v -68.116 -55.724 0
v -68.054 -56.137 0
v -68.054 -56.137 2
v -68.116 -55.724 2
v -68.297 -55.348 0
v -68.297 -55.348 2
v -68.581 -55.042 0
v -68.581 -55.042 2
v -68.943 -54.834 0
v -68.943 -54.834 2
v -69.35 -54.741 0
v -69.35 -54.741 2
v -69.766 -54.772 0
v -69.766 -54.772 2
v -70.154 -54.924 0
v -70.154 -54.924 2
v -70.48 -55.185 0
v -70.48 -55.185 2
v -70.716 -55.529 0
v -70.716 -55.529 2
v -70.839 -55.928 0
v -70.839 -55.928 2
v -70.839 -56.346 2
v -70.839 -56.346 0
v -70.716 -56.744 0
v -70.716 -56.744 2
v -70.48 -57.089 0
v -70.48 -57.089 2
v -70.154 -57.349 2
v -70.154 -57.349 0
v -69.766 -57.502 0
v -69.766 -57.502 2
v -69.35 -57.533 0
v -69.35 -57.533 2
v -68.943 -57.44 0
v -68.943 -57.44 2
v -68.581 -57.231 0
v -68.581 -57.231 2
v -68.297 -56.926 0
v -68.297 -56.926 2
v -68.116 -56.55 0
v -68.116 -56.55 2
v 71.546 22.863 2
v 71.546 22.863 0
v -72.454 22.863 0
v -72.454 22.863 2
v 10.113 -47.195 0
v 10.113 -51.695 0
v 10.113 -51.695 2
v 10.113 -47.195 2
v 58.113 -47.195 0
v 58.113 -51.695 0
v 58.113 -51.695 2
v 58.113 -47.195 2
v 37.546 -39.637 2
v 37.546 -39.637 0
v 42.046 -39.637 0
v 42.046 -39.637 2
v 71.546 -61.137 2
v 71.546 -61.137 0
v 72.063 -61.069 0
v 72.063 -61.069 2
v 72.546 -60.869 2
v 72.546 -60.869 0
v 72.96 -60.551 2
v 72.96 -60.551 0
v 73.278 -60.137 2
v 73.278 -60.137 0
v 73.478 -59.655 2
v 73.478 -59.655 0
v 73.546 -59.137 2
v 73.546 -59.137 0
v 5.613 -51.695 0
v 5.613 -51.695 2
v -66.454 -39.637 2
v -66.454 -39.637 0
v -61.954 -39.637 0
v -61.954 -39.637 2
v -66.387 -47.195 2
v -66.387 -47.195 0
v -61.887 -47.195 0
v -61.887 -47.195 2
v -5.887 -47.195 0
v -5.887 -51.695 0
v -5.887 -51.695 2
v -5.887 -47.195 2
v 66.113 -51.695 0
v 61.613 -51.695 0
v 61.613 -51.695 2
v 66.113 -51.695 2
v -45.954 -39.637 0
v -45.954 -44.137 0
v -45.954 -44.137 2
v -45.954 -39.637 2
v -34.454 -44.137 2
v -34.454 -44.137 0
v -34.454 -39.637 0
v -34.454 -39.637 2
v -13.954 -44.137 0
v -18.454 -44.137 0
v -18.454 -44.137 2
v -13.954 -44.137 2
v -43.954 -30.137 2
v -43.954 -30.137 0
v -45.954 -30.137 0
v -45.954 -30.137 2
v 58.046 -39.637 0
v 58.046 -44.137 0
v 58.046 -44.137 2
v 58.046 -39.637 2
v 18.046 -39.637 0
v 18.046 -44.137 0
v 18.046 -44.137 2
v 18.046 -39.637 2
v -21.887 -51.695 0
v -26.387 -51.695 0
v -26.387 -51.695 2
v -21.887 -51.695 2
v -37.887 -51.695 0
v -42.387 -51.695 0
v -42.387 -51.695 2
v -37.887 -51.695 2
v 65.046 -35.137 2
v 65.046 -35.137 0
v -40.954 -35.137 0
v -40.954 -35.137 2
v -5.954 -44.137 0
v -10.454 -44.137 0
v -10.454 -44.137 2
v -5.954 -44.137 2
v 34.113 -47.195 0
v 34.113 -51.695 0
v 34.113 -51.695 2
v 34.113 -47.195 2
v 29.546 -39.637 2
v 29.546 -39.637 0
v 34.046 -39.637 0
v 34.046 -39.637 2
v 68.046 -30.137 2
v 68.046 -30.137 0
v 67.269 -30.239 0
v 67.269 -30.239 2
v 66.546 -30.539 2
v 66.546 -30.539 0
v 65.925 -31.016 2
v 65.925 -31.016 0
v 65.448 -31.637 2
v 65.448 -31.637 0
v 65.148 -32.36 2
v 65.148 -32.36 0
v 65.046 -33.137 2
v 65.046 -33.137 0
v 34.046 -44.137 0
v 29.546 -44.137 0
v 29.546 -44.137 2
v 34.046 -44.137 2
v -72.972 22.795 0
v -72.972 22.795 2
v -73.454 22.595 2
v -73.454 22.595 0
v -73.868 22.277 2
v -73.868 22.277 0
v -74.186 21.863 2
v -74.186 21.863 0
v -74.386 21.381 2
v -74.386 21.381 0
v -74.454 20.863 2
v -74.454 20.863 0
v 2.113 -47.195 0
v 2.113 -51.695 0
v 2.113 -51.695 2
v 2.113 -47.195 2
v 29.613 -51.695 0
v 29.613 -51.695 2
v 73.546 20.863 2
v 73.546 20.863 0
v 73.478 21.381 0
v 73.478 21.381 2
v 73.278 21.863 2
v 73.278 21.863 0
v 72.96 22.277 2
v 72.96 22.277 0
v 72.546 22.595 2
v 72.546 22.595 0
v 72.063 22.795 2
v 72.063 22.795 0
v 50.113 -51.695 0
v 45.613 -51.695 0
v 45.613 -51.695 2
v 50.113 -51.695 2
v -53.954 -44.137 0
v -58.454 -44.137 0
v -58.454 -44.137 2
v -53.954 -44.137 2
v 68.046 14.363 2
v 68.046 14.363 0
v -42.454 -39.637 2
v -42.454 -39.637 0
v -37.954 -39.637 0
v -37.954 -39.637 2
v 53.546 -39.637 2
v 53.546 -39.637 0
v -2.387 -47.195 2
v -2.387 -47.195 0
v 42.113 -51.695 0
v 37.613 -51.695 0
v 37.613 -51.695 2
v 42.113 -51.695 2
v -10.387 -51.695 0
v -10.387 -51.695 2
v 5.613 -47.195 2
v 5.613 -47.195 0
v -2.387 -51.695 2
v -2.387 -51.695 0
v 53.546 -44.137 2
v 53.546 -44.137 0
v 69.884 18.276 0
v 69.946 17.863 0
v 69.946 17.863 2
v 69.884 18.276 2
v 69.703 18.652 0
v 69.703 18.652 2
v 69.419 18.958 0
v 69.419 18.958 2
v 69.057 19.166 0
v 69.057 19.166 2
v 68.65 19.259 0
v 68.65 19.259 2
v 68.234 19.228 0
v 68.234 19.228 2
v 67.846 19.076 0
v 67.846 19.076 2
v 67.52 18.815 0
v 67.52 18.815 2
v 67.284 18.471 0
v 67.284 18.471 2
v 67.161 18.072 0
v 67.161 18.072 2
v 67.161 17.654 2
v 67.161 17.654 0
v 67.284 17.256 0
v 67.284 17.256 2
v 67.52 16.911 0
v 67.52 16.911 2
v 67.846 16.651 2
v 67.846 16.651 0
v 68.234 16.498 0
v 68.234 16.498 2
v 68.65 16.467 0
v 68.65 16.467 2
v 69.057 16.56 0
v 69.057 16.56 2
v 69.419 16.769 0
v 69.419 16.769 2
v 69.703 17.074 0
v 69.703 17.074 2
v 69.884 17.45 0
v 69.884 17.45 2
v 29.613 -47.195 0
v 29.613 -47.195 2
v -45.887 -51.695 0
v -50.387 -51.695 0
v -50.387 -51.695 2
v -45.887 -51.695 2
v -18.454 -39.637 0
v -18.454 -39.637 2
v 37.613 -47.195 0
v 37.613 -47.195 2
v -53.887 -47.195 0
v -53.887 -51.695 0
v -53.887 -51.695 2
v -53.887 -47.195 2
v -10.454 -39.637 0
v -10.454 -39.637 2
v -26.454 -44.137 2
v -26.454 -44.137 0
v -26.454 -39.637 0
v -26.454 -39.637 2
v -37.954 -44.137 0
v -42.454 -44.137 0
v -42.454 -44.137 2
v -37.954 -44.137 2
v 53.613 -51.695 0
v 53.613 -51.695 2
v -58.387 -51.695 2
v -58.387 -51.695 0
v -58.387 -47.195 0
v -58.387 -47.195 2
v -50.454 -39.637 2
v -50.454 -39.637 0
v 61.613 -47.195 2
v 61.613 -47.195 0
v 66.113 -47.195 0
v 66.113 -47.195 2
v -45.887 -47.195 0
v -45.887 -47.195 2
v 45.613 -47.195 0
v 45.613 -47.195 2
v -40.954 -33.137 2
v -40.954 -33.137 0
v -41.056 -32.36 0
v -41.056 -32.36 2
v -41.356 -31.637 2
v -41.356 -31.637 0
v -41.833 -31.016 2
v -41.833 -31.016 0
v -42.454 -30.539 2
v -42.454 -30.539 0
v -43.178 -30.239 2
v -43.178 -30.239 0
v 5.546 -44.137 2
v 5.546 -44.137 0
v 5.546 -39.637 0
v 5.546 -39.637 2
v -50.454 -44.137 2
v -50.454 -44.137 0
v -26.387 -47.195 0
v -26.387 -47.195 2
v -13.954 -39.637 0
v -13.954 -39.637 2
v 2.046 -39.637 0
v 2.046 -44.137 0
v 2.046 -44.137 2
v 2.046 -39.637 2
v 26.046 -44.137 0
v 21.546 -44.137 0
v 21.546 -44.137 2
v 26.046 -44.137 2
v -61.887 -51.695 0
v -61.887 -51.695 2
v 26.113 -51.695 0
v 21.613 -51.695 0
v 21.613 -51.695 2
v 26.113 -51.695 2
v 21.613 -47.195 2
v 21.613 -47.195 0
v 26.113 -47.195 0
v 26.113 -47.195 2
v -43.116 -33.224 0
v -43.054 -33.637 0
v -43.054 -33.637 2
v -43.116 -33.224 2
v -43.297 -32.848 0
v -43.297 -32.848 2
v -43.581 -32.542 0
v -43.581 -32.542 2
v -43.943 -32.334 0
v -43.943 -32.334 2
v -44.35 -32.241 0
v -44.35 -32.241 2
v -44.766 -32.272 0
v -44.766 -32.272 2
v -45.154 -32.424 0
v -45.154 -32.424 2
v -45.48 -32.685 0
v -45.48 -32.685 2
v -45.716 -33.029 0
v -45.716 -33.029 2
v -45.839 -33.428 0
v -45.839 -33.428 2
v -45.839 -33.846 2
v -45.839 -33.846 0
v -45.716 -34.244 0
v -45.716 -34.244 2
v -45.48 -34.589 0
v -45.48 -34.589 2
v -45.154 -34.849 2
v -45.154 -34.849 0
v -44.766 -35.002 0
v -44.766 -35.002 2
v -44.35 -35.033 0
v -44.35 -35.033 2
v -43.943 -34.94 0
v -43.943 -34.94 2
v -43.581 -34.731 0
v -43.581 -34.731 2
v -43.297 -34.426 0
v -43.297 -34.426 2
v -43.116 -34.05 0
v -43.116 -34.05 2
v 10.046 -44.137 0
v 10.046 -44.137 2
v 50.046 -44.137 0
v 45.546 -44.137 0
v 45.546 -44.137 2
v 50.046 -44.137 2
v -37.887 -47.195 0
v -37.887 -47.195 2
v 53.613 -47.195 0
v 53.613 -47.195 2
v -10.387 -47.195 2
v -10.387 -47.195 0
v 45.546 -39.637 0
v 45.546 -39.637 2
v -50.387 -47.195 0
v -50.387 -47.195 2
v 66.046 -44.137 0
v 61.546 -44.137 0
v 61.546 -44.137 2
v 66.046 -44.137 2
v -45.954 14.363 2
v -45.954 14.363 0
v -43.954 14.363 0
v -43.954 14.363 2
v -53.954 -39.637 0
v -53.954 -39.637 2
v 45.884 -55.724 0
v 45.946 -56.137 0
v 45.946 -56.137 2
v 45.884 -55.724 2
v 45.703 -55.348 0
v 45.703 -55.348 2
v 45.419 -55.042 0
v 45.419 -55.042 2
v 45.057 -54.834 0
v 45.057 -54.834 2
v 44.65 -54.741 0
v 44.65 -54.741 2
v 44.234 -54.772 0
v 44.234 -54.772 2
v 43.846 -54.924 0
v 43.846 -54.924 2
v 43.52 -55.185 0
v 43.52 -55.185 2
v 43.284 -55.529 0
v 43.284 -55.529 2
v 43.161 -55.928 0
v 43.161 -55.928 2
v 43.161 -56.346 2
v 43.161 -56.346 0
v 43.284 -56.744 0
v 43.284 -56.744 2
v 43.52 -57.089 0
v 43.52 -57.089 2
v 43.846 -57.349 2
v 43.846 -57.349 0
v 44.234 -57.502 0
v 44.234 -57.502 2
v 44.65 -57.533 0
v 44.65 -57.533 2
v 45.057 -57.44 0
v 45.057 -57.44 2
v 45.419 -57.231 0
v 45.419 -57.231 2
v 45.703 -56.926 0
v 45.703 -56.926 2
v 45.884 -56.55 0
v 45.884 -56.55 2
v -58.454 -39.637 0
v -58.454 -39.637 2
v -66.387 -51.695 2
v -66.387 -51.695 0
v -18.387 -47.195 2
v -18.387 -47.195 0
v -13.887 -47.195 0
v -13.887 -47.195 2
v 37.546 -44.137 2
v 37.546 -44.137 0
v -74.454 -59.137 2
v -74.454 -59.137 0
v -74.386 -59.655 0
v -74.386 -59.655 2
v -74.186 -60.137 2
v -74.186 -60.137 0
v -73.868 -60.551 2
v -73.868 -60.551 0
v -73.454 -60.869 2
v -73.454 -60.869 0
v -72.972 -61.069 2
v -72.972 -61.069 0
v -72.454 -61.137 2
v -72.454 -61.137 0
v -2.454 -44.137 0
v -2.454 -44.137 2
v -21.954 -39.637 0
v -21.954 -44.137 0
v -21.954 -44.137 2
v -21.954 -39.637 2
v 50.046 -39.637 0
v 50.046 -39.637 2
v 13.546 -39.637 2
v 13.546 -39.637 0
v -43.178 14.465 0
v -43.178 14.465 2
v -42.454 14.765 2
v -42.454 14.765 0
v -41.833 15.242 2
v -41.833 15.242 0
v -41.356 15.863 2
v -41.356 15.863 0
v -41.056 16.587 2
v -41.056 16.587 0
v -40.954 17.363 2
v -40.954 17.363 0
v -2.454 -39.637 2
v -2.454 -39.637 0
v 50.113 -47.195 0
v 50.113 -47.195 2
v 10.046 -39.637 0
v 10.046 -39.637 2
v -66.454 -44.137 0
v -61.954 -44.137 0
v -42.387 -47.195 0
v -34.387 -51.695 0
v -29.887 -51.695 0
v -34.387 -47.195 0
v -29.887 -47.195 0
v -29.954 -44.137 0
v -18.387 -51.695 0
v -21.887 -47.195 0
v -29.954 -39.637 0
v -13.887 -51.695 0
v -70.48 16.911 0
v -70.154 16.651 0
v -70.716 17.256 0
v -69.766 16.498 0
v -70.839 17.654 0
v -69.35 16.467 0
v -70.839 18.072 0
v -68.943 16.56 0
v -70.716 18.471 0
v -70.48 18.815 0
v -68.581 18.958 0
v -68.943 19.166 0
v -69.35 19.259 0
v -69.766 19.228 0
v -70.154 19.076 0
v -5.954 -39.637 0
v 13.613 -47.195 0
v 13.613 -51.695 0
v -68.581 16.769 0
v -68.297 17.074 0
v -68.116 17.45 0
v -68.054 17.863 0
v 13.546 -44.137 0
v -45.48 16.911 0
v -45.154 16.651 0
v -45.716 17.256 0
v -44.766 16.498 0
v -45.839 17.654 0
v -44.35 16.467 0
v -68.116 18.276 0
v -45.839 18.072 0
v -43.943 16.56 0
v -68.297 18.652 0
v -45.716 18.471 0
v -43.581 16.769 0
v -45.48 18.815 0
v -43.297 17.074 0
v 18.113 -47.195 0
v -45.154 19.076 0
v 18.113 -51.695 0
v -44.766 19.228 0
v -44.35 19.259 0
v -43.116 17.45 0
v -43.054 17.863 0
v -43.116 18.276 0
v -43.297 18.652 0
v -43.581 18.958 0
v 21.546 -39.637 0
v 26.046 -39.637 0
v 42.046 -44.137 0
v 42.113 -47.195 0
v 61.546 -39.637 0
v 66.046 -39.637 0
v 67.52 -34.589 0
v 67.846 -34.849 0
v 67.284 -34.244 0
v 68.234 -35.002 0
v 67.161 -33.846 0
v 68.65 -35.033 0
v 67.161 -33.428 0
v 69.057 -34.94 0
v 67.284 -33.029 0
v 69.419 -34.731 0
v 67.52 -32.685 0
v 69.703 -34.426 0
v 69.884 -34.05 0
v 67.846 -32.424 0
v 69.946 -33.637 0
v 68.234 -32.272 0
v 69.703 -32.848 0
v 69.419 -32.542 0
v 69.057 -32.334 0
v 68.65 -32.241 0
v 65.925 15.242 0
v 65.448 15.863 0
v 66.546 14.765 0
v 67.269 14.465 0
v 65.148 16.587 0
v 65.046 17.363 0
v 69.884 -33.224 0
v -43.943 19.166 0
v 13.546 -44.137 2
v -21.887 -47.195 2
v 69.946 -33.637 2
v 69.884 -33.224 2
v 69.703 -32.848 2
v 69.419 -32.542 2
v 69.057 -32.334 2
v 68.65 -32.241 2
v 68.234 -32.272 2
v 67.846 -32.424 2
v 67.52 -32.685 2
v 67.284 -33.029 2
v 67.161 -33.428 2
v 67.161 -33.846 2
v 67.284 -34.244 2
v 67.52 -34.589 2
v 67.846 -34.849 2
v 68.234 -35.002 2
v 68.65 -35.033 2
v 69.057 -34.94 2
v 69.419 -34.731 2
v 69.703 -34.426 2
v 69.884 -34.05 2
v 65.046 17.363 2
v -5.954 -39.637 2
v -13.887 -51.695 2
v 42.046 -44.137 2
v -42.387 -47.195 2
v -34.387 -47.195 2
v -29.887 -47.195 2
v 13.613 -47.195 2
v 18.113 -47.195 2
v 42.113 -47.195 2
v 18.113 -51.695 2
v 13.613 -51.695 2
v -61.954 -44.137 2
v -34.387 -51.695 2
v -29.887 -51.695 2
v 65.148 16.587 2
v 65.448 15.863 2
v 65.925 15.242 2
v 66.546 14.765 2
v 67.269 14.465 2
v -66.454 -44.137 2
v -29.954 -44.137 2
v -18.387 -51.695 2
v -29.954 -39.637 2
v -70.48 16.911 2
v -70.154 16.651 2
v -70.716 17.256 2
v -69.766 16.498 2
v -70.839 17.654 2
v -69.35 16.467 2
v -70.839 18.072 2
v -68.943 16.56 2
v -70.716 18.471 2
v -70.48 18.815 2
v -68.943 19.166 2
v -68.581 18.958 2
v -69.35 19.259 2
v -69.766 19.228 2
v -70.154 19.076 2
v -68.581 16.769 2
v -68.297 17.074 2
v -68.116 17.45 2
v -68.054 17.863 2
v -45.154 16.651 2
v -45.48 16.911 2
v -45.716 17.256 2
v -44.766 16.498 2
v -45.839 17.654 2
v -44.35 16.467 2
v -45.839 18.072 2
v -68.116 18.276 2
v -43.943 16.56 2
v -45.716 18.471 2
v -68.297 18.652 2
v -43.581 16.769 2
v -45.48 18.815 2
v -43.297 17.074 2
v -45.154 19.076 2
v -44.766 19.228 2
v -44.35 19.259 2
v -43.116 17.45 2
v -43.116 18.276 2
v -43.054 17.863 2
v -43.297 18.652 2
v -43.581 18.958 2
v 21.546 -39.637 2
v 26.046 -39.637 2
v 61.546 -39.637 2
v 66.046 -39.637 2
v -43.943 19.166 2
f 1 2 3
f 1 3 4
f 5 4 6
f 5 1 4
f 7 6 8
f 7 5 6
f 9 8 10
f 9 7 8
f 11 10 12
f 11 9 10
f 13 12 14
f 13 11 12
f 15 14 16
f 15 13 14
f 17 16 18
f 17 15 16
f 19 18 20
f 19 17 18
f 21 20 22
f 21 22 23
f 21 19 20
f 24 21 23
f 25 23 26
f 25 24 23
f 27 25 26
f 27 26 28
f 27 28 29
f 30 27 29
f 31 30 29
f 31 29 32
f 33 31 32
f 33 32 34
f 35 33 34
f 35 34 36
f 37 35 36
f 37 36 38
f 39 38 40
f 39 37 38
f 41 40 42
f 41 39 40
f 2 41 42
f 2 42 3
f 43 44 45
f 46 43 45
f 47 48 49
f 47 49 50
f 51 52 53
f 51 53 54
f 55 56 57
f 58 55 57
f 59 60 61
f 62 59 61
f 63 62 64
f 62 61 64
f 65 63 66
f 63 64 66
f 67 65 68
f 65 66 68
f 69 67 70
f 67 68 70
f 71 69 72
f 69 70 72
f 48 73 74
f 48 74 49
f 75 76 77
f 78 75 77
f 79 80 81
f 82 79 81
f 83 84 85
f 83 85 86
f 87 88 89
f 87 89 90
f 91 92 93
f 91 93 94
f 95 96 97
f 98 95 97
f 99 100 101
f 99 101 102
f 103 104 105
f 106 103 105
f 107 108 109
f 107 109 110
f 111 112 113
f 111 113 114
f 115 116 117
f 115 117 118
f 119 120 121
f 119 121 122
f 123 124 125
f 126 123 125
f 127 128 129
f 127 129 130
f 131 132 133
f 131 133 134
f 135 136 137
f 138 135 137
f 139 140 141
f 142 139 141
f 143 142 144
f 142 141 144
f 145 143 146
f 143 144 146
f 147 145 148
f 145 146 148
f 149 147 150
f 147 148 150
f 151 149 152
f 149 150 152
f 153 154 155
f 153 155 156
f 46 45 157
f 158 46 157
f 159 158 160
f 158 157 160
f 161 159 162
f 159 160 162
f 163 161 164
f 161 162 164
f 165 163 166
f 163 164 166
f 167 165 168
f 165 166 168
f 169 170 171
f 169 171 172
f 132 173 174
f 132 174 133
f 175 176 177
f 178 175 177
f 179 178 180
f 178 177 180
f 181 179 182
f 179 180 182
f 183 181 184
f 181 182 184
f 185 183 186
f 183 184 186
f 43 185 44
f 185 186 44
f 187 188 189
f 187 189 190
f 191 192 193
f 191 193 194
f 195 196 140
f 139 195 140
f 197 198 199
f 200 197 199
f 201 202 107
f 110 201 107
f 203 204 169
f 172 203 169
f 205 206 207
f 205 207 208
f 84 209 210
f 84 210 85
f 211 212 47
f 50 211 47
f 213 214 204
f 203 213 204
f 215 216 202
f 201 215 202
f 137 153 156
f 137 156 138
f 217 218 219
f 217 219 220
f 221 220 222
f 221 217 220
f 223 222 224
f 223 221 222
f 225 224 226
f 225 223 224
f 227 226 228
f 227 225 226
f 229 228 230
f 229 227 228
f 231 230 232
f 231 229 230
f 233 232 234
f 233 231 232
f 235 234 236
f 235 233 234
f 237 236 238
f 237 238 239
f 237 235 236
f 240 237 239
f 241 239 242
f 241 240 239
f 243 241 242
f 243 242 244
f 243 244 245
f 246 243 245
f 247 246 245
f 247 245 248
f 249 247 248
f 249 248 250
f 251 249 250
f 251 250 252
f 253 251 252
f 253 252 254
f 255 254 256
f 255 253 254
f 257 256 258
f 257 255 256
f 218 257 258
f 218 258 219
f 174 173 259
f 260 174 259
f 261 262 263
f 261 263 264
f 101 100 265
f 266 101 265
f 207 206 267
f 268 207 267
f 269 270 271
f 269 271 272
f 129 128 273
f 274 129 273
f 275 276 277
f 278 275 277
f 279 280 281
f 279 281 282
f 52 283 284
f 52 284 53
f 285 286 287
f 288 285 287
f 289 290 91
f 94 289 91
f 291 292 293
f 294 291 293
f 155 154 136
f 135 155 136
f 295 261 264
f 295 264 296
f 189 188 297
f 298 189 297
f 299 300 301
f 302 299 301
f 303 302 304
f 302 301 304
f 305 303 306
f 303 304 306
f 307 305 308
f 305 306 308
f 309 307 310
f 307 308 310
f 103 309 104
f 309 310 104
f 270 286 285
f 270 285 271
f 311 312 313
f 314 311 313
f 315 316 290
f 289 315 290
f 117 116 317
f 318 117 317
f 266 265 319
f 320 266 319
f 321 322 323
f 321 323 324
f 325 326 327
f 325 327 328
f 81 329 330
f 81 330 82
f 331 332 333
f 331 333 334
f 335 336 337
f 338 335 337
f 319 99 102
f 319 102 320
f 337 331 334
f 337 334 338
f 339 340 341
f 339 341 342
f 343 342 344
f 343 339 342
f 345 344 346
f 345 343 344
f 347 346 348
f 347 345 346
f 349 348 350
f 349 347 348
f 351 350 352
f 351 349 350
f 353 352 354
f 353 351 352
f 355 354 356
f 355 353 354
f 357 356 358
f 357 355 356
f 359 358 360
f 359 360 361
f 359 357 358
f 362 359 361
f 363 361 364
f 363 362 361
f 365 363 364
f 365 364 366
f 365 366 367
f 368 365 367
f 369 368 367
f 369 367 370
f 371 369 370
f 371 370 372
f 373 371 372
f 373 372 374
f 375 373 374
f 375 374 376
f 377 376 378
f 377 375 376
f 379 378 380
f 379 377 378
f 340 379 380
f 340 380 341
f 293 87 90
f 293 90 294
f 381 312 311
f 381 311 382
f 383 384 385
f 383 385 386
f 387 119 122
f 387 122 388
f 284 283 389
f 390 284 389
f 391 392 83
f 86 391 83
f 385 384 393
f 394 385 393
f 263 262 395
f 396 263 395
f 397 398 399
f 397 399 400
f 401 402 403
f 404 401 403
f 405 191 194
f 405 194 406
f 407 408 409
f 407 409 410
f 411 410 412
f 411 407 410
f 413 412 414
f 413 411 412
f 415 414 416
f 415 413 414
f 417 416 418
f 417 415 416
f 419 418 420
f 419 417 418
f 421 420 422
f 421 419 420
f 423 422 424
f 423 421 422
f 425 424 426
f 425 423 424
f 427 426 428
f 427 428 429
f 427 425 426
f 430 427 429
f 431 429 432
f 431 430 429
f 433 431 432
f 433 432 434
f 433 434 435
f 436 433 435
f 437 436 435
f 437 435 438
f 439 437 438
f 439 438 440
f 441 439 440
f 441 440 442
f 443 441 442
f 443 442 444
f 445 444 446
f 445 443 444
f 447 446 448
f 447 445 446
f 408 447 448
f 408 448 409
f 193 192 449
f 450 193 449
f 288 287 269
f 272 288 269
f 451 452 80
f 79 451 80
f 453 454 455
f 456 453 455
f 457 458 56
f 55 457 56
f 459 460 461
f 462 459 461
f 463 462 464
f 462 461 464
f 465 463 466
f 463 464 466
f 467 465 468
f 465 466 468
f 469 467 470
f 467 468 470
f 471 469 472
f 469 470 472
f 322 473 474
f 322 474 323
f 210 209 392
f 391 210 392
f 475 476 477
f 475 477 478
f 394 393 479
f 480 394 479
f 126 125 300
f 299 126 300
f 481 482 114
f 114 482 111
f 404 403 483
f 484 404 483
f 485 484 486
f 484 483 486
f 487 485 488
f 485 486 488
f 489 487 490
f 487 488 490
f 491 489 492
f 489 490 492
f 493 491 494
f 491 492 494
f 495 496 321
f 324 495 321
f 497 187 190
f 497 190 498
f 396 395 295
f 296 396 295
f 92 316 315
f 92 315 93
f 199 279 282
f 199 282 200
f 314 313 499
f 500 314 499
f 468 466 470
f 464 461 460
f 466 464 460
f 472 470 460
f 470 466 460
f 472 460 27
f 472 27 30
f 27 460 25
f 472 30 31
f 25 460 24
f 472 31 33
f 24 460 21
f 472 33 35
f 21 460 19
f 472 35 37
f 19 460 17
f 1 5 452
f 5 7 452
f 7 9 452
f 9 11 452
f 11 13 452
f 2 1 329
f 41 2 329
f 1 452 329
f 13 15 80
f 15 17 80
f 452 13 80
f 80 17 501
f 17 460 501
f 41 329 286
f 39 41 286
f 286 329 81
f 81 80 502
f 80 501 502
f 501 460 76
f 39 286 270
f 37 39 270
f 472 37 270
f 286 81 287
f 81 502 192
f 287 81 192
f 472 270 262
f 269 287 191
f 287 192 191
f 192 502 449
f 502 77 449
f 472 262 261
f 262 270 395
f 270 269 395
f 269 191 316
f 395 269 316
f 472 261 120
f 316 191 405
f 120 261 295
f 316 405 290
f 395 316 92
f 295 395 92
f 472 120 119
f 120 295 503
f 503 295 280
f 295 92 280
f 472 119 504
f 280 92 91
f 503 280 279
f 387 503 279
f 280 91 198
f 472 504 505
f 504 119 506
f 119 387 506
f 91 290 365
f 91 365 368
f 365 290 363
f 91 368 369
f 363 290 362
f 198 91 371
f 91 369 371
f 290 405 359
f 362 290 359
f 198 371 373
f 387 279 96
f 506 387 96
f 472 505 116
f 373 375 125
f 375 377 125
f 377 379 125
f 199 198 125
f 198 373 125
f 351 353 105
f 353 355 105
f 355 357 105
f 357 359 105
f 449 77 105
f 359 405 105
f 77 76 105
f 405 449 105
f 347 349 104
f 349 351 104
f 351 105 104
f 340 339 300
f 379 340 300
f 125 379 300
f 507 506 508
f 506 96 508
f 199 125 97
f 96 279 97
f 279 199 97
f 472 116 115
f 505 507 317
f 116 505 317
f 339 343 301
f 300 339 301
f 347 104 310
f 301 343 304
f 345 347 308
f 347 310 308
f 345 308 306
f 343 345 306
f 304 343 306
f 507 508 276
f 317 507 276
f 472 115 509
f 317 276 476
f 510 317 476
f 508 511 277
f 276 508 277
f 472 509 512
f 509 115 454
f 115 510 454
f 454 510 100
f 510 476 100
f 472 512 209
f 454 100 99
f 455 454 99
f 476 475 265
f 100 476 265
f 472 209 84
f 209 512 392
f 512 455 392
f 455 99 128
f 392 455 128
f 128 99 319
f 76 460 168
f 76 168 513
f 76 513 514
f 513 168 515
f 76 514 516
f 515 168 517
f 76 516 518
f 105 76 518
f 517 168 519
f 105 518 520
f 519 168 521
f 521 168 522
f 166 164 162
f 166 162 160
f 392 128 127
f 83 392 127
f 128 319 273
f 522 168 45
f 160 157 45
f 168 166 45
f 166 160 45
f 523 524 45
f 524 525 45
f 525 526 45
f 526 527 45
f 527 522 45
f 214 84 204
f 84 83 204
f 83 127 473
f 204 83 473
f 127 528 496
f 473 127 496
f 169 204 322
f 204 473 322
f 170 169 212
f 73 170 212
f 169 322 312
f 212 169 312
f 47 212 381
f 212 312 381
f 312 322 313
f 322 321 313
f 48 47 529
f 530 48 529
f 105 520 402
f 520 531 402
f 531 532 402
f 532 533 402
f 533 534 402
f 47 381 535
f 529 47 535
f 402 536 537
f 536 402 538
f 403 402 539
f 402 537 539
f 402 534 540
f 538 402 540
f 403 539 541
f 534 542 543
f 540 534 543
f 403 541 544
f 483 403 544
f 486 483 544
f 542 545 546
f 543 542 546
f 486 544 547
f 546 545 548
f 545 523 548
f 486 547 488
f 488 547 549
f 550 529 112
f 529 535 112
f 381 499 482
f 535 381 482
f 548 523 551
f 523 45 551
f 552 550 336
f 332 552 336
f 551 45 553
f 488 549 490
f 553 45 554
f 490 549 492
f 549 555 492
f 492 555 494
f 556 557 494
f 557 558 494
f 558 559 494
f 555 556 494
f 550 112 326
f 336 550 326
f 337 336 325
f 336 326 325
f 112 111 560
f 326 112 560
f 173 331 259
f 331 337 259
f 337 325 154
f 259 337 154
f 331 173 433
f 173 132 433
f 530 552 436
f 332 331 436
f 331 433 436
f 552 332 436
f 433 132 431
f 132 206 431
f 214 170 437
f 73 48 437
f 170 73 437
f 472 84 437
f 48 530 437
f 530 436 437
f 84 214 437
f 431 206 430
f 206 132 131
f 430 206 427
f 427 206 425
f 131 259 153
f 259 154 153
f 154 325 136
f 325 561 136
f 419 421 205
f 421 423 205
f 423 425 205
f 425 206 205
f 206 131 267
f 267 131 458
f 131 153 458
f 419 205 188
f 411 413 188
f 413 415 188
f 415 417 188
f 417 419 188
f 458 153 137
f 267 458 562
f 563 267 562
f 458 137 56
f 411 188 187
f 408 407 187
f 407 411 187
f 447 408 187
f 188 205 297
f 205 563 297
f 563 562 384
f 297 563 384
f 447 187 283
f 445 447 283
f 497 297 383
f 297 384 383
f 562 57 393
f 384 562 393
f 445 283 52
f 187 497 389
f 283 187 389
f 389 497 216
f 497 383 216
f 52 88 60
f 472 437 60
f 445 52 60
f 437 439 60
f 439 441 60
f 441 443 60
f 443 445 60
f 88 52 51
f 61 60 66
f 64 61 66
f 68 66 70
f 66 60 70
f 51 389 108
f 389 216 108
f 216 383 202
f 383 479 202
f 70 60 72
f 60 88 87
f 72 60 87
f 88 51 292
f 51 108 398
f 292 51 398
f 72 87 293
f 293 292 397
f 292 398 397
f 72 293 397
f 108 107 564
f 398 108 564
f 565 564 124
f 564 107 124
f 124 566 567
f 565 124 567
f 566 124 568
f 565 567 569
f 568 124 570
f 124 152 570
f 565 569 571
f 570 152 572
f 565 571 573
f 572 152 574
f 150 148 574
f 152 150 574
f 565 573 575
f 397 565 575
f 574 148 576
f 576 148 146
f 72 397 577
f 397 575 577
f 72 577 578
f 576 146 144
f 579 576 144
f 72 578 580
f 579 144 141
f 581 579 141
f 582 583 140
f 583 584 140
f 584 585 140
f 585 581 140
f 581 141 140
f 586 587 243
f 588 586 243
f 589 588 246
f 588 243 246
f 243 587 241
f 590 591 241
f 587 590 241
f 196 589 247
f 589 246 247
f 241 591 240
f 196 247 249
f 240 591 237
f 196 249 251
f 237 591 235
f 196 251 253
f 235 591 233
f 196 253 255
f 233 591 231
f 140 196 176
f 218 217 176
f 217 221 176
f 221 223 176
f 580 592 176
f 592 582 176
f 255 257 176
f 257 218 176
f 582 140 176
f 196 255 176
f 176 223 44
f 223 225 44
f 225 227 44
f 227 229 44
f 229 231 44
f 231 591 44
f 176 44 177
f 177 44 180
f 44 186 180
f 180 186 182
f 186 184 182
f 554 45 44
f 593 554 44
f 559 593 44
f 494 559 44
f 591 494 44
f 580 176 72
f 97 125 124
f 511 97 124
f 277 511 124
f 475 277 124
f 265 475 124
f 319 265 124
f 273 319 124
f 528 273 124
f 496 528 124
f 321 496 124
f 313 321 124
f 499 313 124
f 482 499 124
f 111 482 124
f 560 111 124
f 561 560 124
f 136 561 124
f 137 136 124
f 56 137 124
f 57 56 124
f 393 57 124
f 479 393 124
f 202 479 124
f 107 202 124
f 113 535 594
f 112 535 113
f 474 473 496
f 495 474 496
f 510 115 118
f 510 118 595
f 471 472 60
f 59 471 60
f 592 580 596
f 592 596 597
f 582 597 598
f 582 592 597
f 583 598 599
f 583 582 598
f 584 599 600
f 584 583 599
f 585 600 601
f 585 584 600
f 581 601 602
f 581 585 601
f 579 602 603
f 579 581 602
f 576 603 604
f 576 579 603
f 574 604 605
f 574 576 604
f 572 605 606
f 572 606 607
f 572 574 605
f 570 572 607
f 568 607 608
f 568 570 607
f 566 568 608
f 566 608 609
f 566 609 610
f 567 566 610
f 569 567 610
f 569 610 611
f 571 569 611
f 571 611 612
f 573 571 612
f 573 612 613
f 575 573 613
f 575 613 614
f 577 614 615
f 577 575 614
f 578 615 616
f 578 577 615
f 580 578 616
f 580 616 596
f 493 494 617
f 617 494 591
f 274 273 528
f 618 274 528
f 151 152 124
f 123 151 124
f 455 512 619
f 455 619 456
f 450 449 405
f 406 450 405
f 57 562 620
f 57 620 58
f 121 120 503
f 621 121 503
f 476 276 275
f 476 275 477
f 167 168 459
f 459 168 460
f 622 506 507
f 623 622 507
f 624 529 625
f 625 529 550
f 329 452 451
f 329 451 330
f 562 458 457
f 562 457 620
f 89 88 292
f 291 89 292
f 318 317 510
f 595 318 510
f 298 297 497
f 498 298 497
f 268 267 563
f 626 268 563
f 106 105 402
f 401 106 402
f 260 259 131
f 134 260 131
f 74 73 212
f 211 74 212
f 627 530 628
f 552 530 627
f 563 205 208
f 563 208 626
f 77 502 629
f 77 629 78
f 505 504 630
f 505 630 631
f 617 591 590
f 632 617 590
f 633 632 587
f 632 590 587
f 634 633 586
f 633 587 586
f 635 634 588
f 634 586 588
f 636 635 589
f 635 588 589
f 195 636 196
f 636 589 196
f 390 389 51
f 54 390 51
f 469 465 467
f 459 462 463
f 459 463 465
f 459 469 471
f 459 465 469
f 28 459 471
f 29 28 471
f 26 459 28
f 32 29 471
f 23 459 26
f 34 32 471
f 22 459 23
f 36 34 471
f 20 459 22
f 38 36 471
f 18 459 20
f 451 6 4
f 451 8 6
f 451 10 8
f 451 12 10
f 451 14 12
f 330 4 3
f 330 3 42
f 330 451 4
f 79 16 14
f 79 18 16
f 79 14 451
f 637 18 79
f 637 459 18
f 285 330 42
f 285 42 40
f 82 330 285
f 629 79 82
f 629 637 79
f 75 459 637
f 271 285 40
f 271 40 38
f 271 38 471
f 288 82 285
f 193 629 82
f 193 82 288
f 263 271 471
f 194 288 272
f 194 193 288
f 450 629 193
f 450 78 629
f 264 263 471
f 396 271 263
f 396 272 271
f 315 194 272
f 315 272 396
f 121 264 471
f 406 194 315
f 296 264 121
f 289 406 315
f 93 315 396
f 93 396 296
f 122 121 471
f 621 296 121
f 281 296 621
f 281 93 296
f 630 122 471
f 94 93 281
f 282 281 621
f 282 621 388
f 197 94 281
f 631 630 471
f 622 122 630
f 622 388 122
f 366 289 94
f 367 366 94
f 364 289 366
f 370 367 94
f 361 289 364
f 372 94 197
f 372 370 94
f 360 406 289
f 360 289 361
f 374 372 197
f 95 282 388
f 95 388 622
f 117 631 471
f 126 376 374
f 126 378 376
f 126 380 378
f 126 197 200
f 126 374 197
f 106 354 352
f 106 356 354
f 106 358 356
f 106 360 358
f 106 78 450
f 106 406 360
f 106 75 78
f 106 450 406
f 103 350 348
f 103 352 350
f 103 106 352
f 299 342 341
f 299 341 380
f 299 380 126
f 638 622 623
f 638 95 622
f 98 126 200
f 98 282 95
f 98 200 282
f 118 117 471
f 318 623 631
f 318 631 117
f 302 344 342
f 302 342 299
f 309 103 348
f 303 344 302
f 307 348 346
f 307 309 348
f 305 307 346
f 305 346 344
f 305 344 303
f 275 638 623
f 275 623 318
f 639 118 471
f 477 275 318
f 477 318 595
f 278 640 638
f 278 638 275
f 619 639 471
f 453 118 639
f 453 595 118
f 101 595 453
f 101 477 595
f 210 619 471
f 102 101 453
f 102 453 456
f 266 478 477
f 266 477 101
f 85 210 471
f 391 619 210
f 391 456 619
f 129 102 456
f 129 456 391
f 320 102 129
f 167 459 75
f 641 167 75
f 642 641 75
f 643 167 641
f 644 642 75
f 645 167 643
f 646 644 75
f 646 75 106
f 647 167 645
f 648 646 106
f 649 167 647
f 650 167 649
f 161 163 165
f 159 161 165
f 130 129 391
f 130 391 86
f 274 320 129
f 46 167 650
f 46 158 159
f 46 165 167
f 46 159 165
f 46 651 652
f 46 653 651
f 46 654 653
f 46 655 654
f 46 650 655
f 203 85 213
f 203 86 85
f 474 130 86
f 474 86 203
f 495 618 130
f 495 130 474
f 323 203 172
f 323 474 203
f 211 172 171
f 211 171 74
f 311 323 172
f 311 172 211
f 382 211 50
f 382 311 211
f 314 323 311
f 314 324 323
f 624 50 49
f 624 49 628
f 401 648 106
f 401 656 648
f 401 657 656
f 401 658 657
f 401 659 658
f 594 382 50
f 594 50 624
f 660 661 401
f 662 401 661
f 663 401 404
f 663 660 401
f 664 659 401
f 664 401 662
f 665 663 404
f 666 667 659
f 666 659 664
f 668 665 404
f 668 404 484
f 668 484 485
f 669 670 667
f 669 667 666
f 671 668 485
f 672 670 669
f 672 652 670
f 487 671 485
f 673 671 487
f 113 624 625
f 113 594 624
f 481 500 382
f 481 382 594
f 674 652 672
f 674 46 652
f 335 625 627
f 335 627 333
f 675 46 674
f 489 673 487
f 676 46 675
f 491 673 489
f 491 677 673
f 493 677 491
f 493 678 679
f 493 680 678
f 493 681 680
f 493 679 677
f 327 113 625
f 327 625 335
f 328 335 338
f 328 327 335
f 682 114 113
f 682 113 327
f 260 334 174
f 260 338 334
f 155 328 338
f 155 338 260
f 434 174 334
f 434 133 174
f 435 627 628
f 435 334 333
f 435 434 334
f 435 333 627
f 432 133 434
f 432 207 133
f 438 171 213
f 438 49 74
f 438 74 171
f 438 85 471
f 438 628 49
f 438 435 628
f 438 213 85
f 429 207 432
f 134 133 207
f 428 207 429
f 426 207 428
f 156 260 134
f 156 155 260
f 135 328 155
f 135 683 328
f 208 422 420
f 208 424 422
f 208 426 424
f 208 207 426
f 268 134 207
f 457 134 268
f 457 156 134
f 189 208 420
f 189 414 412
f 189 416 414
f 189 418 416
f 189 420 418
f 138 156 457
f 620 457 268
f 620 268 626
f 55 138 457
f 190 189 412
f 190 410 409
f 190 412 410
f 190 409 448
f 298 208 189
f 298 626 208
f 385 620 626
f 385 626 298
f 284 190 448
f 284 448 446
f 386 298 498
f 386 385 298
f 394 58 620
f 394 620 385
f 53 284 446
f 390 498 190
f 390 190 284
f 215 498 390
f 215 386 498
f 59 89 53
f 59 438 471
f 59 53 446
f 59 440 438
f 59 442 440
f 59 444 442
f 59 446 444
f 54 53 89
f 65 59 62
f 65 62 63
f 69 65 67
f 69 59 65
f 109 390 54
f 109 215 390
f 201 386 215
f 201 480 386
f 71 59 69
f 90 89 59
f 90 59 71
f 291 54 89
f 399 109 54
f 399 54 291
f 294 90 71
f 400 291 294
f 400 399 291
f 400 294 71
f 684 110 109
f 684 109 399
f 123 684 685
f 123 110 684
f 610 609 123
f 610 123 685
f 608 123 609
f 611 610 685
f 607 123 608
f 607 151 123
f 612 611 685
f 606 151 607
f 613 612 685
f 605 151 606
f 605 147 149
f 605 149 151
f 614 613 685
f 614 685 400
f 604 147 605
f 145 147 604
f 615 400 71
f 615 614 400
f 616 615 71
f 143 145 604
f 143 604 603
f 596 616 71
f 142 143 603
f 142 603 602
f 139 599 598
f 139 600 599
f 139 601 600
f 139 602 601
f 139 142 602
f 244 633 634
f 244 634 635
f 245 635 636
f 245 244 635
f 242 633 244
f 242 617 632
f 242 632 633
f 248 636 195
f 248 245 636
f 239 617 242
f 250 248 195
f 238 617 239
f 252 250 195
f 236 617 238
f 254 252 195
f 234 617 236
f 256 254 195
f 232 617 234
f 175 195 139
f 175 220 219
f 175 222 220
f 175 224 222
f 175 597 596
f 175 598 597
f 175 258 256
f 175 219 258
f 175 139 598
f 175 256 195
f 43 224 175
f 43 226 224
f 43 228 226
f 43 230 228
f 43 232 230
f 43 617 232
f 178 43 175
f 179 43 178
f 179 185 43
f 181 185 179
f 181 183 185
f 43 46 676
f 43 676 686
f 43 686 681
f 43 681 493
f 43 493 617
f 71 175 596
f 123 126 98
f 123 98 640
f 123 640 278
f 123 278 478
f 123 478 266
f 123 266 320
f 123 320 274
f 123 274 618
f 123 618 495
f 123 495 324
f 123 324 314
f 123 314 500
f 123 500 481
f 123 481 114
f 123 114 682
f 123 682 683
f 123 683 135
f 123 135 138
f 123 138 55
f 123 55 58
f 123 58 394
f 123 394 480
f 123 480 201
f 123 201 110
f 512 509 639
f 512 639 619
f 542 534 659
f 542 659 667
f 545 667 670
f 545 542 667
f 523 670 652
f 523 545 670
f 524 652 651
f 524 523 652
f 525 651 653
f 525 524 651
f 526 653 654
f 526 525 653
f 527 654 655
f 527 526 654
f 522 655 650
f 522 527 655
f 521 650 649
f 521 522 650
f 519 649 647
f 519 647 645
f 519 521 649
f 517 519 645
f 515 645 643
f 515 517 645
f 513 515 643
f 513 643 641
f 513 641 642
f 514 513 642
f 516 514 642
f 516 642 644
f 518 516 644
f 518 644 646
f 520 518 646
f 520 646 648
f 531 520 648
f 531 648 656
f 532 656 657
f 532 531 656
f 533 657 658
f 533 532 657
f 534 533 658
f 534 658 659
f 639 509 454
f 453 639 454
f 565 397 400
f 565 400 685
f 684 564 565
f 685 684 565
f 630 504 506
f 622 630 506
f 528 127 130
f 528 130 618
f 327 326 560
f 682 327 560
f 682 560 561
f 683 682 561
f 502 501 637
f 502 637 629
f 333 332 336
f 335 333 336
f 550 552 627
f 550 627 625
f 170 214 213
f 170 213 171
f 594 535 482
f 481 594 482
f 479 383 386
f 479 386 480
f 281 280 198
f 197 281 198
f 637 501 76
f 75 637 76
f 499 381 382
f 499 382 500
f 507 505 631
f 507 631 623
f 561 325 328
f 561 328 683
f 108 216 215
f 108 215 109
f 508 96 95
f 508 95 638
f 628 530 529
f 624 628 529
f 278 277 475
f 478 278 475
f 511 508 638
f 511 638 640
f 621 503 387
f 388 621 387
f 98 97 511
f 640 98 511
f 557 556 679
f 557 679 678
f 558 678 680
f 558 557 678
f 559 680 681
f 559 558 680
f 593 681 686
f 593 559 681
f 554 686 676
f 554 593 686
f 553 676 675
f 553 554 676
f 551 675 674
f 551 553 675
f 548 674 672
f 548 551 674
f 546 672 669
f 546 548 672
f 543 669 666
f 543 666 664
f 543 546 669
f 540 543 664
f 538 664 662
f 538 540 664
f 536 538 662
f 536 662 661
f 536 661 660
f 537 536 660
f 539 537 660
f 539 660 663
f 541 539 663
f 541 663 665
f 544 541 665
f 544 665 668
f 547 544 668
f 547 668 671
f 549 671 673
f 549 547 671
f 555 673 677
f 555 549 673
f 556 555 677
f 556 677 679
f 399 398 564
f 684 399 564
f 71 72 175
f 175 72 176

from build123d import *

# Parameters (mm, degrees)
F0_R     = 1.4
F0_W     = 4.5
F0_H     = 4.5
F1_DEPTH = 2


with BuildPart() as f1:
    # F0 (on Top) → F1 (new body)
    with BuildSketch(Plane.XY):
        with BuildLine():
            Line((71.545826, 22.863086), (-72.454174, 22.863086))
            ThreePointArc((-72.454174, 22.863086), (-73.868388, 22.277299), (-74.454174, 20.863086))
            Line((-74.454174, 20.863086), (-74.454174, -59.136914))
            ThreePointArc((-74.454174, -59.136914), (-73.868388, -60.551128), (-72.454174, -61.136914))
            Line((-72.454174, -61.136914), (71.545826, -61.136914))
            ThreePointArc((71.545826, -61.136914), (72.960039, -60.551128), (73.545826, -59.136914))
            Line((73.545826, -59.136914), (73.545826, 20.863086))
            ThreePointArc((73.545826, 20.863086), (72.960039, 22.277299), (71.545826, 22.863086))
        make_face()
        with Locations((-69.454174, -56.136914)):
            Circle(F0_R, mode=Mode.SUBTRACT)
        with Locations((-64.137191, -49.445186)):
            Rectangle(F0_W, F0_H, mode=Mode.SUBTRACT)
        with Locations((-56.137191, -49.445186)):
            Rectangle(F0_W, F0_H, mode=Mode.SUBTRACT)
        with Locations((-64.204174, -41.886914)):
            Rectangle(F0_W, F0_H, mode=Mode.SUBTRACT)
        with Locations((-56.204174, -41.886914)):
            Rectangle(F0_W, F0_H, mode=Mode.SUBTRACT)
        with Locations((-48.137191, -49.445186)):
            Rectangle(F0_W, F0_H, mode=Mode.SUBTRACT)
        with Locations((-40.137191, -49.445186)):
            Rectangle(F0_W, F0_H, mode=Mode.SUBTRACT)
        with Locations((-48.204174, -41.886914)):
            Rectangle(F0_W, F0_H, mode=Mode.SUBTRACT)
        with Locations((-40.204174, -41.886914)):
            Rectangle(F0_W, F0_H, mode=Mode.SUBTRACT)
        with Locations((-32.137191, -49.445186)):
            Rectangle(F0_W, F0_H, mode=Mode.SUBTRACT)
        with Locations((-24.137191, -49.445186)):
            Rectangle(F0_W, F0_H, mode=Mode.SUBTRACT)
        with Locations((-32.204174, -41.886914)):
            Rectangle(F0_W, F0_H, mode=Mode.SUBTRACT)
        with Locations((-24.204174, -41.886914)):
            Rectangle(F0_W, F0_H, mode=Mode.SUBTRACT)
        with Locations((-16.137191, -49.445186)):
            Rectangle(F0_W, F0_H, mode=Mode.SUBTRACT)
        with Locations((-8.137191, -49.445186)):
            Rectangle(F0_W, F0_H, mode=Mode.SUBTRACT)
        with Locations((-16.204174, -41.886914)):
            Rectangle(F0_W, F0_H, mode=Mode.SUBTRACT)
        with Locations((-8.204174, -41.886914)):
            Rectangle(F0_W, F0_H, mode=Mode.SUBTRACT)
        with Locations((-44.454174, -33.636914)):
            Circle(F0_R, mode=Mode.SUBTRACT)
        with Locations((-0.137191, -49.445186)):
            Rectangle(F0_W, F0_H, mode=Mode.SUBTRACT)
        with Locations((7.862809, -49.445186)):
            Rectangle(F0_W, F0_H, mode=Mode.SUBTRACT)
        with Locations((15.862809, -49.445186)):
            Rectangle(F0_W, F0_H, mode=Mode.SUBTRACT)
        with Locations((-0.204174, -41.886914)):
            Rectangle(F0_W, F0_H, mode=Mode.SUBTRACT)
        with Locations((7.795826, -41.886914)):
            Rectangle(F0_W, F0_H, mode=Mode.SUBTRACT)
        with Locations((15.795826, -41.886914)):
            Rectangle(F0_W, F0_H, mode=Mode.SUBTRACT)
        with Locations((23.862809, -49.445186)):
            Rectangle(F0_W, F0_H, mode=Mode.SUBTRACT)
        with Locations((31.862809, -49.445186)):
            Rectangle(F0_W, F0_H, mode=Mode.SUBTRACT)
        with Locations((23.795826, -41.886914)):
            Rectangle(F0_W, F0_H, mode=Mode.SUBTRACT)
        with Locations((31.795826, -41.886914)):
            Rectangle(F0_W, F0_H, mode=Mode.SUBTRACT)
        with Locations((44.545826, -56.136914)):
            Circle(F0_R, mode=Mode.SUBTRACT)
        with Locations((39.862809, -49.445186)):
            Rectangle(F0_W, F0_H, mode=Mode.SUBTRACT)
        with Locations((47.862809, -49.445186)):
            Rectangle(F0_W, F0_H, mode=Mode.SUBTRACT)
        with Locations((39.795826, -41.886914)):
            Rectangle(F0_W, F0_H, mode=Mode.SUBTRACT)
        with Locations((47.795826, -41.886914)):
            Rectangle(F0_W, F0_H, mode=Mode.SUBTRACT)
        with Locations((55.862809, -49.445186)):
            Rectangle(F0_W, F0_H, mode=Mode.SUBTRACT)
        with Locations((63.862809, -49.445186)):
            Rectangle(F0_W, F0_H, mode=Mode.SUBTRACT)
        with Locations((55.795826, -41.886914)):
            Rectangle(F0_W, F0_H, mode=Mode.SUBTRACT)
        with Locations((63.795826, -41.886914)):
            Rectangle(F0_W, F0_H, mode=Mode.SUBTRACT)
        with Locations((68.545826, -33.636914)):
            Circle(F0_R, mode=Mode.SUBTRACT)
        with Locations((-69.454174, 17.863086)):
            Circle(F0_R, mode=Mode.SUBTRACT)
        with Locations((-44.454174, 17.863086)):
            Circle(F0_R, mode=Mode.SUBTRACT)
        with BuildLine():
            Line((-45.954174, -30.136914), (-45.954174, 14.363086))
            Line((-45.954174, 14.363086), (-43.954174, 14.363086))
            ThreePointArc((-43.954174, 14.363086), (-41.832854, 15.241765), (-40.954174, 17.363086))
            Line((-40.954174, 17.363086), (65.045826, 17.363086))
            ThreePointArc((65.045826, 17.363086), (65.924505, 15.241765), (68.045826, 14.363086))
            Line((68.045826, 14.363086), (68.045826, -30.136914))
            ThreePointArc((68.045826, -30.136914), (65.924505, -31.015594), (65.045826, -33.136914))
            Line((65.045826, -33.136914), (65.045826, -35.136914))
            Line((65.045826, -35.136914), (-40.954174, -35.136914))
            Line((-40.954174, -35.136914), (-40.954174, -33.136914))
            ThreePointArc((-40.954174, -33.136914), (-41.832854, -31.015594), (-43.954174, -30.136914))
            Line((-43.954174, -30.136914), (-45.954174, -30.136914))
        make_face(mode=Mode.SUBTRACT)
        with Locations((68.545826, 17.863086)):
            Circle(F0_R, mode=Mode.SUBTRACT)
    extrude(amount=F1_DEPTH)


solid = f1.part
